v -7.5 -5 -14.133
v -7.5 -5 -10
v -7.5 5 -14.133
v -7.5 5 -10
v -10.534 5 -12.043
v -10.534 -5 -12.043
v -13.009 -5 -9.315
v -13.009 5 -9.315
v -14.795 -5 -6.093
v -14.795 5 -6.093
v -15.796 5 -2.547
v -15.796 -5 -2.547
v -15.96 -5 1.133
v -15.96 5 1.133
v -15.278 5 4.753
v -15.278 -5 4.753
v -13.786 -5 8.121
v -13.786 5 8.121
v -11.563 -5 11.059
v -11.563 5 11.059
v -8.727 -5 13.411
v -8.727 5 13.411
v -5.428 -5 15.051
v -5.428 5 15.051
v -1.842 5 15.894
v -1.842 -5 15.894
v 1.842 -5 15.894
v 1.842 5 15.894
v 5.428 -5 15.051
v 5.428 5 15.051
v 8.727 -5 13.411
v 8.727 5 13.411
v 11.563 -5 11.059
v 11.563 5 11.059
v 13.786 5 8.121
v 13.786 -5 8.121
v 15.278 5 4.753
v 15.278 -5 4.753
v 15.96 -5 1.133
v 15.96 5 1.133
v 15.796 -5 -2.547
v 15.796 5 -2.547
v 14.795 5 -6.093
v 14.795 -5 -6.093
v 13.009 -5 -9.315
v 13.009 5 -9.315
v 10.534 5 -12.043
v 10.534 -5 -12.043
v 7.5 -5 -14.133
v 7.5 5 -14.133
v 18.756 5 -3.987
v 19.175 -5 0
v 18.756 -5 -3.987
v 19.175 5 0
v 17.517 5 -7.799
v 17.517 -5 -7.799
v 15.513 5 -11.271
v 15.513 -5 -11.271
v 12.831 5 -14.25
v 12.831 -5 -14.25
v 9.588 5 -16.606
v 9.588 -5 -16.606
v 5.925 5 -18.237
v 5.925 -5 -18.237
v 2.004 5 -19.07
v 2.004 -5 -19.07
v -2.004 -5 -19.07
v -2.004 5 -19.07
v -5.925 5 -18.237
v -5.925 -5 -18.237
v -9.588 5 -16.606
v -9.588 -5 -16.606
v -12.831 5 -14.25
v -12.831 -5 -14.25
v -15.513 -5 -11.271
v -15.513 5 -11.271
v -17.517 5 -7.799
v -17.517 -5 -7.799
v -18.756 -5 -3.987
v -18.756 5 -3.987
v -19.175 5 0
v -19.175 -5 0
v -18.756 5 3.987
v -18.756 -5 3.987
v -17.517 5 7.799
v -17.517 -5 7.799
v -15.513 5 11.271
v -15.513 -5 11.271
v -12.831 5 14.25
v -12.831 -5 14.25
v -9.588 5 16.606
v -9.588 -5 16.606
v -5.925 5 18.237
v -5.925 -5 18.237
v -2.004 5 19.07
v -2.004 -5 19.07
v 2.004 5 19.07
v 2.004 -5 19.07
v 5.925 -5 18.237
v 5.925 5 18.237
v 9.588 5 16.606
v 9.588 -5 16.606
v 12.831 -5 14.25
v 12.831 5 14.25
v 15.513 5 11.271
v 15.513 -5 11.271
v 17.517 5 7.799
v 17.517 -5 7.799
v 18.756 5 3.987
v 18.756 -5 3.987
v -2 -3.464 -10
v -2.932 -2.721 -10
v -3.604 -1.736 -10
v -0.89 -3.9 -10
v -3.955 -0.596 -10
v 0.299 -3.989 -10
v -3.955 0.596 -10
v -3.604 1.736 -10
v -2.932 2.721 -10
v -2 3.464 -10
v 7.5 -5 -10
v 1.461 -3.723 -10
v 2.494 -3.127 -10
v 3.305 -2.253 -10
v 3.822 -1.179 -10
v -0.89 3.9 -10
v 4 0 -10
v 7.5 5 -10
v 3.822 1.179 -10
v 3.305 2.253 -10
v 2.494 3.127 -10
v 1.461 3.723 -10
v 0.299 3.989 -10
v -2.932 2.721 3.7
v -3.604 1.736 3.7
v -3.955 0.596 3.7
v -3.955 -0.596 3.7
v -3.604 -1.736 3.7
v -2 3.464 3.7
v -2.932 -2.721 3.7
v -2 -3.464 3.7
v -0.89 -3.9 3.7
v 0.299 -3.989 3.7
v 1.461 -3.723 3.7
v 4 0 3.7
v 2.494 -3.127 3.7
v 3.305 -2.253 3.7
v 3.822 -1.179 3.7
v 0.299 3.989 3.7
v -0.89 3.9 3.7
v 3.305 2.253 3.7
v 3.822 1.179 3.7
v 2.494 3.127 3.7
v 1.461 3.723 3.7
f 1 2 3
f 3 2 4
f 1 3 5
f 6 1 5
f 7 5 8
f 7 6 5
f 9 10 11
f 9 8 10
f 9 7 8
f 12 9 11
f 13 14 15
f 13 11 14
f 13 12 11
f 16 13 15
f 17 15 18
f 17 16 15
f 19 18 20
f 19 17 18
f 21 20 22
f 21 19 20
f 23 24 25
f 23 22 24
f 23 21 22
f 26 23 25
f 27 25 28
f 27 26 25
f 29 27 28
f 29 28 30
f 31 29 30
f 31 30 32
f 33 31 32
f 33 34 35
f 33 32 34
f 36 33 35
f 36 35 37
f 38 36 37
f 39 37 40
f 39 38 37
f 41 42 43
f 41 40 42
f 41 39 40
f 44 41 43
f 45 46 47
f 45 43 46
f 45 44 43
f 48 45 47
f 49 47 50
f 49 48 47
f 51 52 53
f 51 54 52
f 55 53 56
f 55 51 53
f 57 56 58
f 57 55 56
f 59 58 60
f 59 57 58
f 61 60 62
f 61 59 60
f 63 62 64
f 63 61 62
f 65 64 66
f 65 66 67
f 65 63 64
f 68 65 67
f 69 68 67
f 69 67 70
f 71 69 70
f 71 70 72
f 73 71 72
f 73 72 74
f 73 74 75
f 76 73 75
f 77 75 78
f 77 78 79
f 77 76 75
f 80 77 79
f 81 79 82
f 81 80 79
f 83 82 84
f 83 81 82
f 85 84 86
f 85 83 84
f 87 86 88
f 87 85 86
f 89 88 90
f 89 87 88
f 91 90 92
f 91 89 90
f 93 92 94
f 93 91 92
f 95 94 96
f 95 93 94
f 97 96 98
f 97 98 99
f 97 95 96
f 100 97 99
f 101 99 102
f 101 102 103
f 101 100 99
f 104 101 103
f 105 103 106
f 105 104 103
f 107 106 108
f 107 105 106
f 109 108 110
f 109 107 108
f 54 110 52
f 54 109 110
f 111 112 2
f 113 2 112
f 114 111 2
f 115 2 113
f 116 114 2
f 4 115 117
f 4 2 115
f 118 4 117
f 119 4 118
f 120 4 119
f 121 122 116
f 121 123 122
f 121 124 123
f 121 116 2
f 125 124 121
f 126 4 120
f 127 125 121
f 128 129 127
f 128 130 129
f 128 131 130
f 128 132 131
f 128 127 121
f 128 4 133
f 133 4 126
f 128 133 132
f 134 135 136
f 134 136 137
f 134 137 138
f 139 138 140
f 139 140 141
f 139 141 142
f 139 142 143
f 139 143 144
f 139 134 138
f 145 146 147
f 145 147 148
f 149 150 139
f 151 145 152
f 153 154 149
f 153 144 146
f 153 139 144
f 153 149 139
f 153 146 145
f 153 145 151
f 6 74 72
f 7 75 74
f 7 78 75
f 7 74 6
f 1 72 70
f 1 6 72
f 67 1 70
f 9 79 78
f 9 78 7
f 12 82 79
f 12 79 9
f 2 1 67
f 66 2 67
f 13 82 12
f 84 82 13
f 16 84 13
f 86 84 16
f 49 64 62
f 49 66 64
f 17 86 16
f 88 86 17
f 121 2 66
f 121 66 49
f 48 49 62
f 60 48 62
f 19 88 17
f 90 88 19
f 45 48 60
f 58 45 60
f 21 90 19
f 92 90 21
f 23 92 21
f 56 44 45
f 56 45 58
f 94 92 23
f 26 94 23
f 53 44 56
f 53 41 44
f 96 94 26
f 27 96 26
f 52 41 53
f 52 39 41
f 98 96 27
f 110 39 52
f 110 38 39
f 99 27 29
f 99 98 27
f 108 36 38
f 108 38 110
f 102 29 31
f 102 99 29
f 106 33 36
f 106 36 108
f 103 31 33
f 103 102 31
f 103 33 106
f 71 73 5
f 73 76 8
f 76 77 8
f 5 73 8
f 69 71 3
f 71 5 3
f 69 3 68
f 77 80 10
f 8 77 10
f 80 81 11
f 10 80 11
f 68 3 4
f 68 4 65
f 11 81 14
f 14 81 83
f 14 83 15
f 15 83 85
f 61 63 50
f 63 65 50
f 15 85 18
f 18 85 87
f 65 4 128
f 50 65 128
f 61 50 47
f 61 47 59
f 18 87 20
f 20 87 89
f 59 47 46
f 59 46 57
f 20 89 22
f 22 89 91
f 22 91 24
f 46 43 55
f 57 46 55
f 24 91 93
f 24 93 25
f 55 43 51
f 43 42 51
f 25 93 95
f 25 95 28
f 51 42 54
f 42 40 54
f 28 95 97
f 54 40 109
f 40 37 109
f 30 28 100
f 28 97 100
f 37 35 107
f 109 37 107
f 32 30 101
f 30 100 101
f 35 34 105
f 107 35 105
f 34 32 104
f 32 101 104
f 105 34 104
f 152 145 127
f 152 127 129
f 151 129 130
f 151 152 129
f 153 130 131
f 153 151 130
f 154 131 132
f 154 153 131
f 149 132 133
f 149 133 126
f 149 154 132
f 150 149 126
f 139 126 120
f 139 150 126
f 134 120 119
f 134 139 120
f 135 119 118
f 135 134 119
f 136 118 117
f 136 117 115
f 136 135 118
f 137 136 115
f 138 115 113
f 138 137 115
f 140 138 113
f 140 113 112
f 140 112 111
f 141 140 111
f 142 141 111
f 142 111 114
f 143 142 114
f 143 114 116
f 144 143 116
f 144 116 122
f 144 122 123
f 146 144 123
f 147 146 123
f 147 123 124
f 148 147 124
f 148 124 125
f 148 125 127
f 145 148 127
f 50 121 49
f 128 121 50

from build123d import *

# Parameters (mm, degrees)
SKETCH6_R           = 19.175
SKETCH6_R_2         = 16
BOSS_EXTRUDE4_DEPTH = 5
BOSS_EXTRUDE5_REACH = 32.265
SKETCH7_R           = 4
BOSS_EXTRUDE6_REACH = 37.268
SKETCH8_W           = 15
SKETCH8_H           = 10


with BuildPart() as part:
    # Sketch6 → Boss-Extrude4 (new, symmetric)
    with BuildSketch(Plane(origin=(0, 0, 0), x_dir=(1, 0, 0), z_dir=(0, 1, 0))):
        Circle(SKETCH6_R)
        Circle(SKETCH6_R_2, mode=Mode.SUBTRACT)
    extrude(amount=BOSS_EXTRUDE4_DEPTH, both=True)

    # Sketch7 → Boss-Extrude5 (add, up to next)
    with BuildSketch(Plane.XY.offset(3.7), mode=Mode.PRIVATE) as boss_extrude5_sk1:
        Circle(SKETCH7_R)
    boss_extrude5_tool1 = extrude(boss_extrude5_sk1.sketch, amount=-BOSS_EXTRUDE5_REACH, mode=Mode.PRIVATE) - part.part
    add(boss_extrude5_tool1.solids().sort_by_distance((0, 0, 3.7))[0])

    # Sketch8 → Boss-Extrude6 (add, up to next)
    with BuildSketch(Plane.XY.offset(-10), mode=Mode.PRIVATE) as boss_extrude6_sk1:
        Rectangle(SKETCH8_W, SKETCH8_H)
    boss_extrude6_tool1 = extrude(boss_extrude6_sk1.sketch, amount=-BOSS_EXTRUDE6_REACH, mode=Mode.PRIVATE) - part.part
    add(boss_extrude6_tool1.solids().sort_by_distance((0, 0, -10))[0])


solid = part.part
